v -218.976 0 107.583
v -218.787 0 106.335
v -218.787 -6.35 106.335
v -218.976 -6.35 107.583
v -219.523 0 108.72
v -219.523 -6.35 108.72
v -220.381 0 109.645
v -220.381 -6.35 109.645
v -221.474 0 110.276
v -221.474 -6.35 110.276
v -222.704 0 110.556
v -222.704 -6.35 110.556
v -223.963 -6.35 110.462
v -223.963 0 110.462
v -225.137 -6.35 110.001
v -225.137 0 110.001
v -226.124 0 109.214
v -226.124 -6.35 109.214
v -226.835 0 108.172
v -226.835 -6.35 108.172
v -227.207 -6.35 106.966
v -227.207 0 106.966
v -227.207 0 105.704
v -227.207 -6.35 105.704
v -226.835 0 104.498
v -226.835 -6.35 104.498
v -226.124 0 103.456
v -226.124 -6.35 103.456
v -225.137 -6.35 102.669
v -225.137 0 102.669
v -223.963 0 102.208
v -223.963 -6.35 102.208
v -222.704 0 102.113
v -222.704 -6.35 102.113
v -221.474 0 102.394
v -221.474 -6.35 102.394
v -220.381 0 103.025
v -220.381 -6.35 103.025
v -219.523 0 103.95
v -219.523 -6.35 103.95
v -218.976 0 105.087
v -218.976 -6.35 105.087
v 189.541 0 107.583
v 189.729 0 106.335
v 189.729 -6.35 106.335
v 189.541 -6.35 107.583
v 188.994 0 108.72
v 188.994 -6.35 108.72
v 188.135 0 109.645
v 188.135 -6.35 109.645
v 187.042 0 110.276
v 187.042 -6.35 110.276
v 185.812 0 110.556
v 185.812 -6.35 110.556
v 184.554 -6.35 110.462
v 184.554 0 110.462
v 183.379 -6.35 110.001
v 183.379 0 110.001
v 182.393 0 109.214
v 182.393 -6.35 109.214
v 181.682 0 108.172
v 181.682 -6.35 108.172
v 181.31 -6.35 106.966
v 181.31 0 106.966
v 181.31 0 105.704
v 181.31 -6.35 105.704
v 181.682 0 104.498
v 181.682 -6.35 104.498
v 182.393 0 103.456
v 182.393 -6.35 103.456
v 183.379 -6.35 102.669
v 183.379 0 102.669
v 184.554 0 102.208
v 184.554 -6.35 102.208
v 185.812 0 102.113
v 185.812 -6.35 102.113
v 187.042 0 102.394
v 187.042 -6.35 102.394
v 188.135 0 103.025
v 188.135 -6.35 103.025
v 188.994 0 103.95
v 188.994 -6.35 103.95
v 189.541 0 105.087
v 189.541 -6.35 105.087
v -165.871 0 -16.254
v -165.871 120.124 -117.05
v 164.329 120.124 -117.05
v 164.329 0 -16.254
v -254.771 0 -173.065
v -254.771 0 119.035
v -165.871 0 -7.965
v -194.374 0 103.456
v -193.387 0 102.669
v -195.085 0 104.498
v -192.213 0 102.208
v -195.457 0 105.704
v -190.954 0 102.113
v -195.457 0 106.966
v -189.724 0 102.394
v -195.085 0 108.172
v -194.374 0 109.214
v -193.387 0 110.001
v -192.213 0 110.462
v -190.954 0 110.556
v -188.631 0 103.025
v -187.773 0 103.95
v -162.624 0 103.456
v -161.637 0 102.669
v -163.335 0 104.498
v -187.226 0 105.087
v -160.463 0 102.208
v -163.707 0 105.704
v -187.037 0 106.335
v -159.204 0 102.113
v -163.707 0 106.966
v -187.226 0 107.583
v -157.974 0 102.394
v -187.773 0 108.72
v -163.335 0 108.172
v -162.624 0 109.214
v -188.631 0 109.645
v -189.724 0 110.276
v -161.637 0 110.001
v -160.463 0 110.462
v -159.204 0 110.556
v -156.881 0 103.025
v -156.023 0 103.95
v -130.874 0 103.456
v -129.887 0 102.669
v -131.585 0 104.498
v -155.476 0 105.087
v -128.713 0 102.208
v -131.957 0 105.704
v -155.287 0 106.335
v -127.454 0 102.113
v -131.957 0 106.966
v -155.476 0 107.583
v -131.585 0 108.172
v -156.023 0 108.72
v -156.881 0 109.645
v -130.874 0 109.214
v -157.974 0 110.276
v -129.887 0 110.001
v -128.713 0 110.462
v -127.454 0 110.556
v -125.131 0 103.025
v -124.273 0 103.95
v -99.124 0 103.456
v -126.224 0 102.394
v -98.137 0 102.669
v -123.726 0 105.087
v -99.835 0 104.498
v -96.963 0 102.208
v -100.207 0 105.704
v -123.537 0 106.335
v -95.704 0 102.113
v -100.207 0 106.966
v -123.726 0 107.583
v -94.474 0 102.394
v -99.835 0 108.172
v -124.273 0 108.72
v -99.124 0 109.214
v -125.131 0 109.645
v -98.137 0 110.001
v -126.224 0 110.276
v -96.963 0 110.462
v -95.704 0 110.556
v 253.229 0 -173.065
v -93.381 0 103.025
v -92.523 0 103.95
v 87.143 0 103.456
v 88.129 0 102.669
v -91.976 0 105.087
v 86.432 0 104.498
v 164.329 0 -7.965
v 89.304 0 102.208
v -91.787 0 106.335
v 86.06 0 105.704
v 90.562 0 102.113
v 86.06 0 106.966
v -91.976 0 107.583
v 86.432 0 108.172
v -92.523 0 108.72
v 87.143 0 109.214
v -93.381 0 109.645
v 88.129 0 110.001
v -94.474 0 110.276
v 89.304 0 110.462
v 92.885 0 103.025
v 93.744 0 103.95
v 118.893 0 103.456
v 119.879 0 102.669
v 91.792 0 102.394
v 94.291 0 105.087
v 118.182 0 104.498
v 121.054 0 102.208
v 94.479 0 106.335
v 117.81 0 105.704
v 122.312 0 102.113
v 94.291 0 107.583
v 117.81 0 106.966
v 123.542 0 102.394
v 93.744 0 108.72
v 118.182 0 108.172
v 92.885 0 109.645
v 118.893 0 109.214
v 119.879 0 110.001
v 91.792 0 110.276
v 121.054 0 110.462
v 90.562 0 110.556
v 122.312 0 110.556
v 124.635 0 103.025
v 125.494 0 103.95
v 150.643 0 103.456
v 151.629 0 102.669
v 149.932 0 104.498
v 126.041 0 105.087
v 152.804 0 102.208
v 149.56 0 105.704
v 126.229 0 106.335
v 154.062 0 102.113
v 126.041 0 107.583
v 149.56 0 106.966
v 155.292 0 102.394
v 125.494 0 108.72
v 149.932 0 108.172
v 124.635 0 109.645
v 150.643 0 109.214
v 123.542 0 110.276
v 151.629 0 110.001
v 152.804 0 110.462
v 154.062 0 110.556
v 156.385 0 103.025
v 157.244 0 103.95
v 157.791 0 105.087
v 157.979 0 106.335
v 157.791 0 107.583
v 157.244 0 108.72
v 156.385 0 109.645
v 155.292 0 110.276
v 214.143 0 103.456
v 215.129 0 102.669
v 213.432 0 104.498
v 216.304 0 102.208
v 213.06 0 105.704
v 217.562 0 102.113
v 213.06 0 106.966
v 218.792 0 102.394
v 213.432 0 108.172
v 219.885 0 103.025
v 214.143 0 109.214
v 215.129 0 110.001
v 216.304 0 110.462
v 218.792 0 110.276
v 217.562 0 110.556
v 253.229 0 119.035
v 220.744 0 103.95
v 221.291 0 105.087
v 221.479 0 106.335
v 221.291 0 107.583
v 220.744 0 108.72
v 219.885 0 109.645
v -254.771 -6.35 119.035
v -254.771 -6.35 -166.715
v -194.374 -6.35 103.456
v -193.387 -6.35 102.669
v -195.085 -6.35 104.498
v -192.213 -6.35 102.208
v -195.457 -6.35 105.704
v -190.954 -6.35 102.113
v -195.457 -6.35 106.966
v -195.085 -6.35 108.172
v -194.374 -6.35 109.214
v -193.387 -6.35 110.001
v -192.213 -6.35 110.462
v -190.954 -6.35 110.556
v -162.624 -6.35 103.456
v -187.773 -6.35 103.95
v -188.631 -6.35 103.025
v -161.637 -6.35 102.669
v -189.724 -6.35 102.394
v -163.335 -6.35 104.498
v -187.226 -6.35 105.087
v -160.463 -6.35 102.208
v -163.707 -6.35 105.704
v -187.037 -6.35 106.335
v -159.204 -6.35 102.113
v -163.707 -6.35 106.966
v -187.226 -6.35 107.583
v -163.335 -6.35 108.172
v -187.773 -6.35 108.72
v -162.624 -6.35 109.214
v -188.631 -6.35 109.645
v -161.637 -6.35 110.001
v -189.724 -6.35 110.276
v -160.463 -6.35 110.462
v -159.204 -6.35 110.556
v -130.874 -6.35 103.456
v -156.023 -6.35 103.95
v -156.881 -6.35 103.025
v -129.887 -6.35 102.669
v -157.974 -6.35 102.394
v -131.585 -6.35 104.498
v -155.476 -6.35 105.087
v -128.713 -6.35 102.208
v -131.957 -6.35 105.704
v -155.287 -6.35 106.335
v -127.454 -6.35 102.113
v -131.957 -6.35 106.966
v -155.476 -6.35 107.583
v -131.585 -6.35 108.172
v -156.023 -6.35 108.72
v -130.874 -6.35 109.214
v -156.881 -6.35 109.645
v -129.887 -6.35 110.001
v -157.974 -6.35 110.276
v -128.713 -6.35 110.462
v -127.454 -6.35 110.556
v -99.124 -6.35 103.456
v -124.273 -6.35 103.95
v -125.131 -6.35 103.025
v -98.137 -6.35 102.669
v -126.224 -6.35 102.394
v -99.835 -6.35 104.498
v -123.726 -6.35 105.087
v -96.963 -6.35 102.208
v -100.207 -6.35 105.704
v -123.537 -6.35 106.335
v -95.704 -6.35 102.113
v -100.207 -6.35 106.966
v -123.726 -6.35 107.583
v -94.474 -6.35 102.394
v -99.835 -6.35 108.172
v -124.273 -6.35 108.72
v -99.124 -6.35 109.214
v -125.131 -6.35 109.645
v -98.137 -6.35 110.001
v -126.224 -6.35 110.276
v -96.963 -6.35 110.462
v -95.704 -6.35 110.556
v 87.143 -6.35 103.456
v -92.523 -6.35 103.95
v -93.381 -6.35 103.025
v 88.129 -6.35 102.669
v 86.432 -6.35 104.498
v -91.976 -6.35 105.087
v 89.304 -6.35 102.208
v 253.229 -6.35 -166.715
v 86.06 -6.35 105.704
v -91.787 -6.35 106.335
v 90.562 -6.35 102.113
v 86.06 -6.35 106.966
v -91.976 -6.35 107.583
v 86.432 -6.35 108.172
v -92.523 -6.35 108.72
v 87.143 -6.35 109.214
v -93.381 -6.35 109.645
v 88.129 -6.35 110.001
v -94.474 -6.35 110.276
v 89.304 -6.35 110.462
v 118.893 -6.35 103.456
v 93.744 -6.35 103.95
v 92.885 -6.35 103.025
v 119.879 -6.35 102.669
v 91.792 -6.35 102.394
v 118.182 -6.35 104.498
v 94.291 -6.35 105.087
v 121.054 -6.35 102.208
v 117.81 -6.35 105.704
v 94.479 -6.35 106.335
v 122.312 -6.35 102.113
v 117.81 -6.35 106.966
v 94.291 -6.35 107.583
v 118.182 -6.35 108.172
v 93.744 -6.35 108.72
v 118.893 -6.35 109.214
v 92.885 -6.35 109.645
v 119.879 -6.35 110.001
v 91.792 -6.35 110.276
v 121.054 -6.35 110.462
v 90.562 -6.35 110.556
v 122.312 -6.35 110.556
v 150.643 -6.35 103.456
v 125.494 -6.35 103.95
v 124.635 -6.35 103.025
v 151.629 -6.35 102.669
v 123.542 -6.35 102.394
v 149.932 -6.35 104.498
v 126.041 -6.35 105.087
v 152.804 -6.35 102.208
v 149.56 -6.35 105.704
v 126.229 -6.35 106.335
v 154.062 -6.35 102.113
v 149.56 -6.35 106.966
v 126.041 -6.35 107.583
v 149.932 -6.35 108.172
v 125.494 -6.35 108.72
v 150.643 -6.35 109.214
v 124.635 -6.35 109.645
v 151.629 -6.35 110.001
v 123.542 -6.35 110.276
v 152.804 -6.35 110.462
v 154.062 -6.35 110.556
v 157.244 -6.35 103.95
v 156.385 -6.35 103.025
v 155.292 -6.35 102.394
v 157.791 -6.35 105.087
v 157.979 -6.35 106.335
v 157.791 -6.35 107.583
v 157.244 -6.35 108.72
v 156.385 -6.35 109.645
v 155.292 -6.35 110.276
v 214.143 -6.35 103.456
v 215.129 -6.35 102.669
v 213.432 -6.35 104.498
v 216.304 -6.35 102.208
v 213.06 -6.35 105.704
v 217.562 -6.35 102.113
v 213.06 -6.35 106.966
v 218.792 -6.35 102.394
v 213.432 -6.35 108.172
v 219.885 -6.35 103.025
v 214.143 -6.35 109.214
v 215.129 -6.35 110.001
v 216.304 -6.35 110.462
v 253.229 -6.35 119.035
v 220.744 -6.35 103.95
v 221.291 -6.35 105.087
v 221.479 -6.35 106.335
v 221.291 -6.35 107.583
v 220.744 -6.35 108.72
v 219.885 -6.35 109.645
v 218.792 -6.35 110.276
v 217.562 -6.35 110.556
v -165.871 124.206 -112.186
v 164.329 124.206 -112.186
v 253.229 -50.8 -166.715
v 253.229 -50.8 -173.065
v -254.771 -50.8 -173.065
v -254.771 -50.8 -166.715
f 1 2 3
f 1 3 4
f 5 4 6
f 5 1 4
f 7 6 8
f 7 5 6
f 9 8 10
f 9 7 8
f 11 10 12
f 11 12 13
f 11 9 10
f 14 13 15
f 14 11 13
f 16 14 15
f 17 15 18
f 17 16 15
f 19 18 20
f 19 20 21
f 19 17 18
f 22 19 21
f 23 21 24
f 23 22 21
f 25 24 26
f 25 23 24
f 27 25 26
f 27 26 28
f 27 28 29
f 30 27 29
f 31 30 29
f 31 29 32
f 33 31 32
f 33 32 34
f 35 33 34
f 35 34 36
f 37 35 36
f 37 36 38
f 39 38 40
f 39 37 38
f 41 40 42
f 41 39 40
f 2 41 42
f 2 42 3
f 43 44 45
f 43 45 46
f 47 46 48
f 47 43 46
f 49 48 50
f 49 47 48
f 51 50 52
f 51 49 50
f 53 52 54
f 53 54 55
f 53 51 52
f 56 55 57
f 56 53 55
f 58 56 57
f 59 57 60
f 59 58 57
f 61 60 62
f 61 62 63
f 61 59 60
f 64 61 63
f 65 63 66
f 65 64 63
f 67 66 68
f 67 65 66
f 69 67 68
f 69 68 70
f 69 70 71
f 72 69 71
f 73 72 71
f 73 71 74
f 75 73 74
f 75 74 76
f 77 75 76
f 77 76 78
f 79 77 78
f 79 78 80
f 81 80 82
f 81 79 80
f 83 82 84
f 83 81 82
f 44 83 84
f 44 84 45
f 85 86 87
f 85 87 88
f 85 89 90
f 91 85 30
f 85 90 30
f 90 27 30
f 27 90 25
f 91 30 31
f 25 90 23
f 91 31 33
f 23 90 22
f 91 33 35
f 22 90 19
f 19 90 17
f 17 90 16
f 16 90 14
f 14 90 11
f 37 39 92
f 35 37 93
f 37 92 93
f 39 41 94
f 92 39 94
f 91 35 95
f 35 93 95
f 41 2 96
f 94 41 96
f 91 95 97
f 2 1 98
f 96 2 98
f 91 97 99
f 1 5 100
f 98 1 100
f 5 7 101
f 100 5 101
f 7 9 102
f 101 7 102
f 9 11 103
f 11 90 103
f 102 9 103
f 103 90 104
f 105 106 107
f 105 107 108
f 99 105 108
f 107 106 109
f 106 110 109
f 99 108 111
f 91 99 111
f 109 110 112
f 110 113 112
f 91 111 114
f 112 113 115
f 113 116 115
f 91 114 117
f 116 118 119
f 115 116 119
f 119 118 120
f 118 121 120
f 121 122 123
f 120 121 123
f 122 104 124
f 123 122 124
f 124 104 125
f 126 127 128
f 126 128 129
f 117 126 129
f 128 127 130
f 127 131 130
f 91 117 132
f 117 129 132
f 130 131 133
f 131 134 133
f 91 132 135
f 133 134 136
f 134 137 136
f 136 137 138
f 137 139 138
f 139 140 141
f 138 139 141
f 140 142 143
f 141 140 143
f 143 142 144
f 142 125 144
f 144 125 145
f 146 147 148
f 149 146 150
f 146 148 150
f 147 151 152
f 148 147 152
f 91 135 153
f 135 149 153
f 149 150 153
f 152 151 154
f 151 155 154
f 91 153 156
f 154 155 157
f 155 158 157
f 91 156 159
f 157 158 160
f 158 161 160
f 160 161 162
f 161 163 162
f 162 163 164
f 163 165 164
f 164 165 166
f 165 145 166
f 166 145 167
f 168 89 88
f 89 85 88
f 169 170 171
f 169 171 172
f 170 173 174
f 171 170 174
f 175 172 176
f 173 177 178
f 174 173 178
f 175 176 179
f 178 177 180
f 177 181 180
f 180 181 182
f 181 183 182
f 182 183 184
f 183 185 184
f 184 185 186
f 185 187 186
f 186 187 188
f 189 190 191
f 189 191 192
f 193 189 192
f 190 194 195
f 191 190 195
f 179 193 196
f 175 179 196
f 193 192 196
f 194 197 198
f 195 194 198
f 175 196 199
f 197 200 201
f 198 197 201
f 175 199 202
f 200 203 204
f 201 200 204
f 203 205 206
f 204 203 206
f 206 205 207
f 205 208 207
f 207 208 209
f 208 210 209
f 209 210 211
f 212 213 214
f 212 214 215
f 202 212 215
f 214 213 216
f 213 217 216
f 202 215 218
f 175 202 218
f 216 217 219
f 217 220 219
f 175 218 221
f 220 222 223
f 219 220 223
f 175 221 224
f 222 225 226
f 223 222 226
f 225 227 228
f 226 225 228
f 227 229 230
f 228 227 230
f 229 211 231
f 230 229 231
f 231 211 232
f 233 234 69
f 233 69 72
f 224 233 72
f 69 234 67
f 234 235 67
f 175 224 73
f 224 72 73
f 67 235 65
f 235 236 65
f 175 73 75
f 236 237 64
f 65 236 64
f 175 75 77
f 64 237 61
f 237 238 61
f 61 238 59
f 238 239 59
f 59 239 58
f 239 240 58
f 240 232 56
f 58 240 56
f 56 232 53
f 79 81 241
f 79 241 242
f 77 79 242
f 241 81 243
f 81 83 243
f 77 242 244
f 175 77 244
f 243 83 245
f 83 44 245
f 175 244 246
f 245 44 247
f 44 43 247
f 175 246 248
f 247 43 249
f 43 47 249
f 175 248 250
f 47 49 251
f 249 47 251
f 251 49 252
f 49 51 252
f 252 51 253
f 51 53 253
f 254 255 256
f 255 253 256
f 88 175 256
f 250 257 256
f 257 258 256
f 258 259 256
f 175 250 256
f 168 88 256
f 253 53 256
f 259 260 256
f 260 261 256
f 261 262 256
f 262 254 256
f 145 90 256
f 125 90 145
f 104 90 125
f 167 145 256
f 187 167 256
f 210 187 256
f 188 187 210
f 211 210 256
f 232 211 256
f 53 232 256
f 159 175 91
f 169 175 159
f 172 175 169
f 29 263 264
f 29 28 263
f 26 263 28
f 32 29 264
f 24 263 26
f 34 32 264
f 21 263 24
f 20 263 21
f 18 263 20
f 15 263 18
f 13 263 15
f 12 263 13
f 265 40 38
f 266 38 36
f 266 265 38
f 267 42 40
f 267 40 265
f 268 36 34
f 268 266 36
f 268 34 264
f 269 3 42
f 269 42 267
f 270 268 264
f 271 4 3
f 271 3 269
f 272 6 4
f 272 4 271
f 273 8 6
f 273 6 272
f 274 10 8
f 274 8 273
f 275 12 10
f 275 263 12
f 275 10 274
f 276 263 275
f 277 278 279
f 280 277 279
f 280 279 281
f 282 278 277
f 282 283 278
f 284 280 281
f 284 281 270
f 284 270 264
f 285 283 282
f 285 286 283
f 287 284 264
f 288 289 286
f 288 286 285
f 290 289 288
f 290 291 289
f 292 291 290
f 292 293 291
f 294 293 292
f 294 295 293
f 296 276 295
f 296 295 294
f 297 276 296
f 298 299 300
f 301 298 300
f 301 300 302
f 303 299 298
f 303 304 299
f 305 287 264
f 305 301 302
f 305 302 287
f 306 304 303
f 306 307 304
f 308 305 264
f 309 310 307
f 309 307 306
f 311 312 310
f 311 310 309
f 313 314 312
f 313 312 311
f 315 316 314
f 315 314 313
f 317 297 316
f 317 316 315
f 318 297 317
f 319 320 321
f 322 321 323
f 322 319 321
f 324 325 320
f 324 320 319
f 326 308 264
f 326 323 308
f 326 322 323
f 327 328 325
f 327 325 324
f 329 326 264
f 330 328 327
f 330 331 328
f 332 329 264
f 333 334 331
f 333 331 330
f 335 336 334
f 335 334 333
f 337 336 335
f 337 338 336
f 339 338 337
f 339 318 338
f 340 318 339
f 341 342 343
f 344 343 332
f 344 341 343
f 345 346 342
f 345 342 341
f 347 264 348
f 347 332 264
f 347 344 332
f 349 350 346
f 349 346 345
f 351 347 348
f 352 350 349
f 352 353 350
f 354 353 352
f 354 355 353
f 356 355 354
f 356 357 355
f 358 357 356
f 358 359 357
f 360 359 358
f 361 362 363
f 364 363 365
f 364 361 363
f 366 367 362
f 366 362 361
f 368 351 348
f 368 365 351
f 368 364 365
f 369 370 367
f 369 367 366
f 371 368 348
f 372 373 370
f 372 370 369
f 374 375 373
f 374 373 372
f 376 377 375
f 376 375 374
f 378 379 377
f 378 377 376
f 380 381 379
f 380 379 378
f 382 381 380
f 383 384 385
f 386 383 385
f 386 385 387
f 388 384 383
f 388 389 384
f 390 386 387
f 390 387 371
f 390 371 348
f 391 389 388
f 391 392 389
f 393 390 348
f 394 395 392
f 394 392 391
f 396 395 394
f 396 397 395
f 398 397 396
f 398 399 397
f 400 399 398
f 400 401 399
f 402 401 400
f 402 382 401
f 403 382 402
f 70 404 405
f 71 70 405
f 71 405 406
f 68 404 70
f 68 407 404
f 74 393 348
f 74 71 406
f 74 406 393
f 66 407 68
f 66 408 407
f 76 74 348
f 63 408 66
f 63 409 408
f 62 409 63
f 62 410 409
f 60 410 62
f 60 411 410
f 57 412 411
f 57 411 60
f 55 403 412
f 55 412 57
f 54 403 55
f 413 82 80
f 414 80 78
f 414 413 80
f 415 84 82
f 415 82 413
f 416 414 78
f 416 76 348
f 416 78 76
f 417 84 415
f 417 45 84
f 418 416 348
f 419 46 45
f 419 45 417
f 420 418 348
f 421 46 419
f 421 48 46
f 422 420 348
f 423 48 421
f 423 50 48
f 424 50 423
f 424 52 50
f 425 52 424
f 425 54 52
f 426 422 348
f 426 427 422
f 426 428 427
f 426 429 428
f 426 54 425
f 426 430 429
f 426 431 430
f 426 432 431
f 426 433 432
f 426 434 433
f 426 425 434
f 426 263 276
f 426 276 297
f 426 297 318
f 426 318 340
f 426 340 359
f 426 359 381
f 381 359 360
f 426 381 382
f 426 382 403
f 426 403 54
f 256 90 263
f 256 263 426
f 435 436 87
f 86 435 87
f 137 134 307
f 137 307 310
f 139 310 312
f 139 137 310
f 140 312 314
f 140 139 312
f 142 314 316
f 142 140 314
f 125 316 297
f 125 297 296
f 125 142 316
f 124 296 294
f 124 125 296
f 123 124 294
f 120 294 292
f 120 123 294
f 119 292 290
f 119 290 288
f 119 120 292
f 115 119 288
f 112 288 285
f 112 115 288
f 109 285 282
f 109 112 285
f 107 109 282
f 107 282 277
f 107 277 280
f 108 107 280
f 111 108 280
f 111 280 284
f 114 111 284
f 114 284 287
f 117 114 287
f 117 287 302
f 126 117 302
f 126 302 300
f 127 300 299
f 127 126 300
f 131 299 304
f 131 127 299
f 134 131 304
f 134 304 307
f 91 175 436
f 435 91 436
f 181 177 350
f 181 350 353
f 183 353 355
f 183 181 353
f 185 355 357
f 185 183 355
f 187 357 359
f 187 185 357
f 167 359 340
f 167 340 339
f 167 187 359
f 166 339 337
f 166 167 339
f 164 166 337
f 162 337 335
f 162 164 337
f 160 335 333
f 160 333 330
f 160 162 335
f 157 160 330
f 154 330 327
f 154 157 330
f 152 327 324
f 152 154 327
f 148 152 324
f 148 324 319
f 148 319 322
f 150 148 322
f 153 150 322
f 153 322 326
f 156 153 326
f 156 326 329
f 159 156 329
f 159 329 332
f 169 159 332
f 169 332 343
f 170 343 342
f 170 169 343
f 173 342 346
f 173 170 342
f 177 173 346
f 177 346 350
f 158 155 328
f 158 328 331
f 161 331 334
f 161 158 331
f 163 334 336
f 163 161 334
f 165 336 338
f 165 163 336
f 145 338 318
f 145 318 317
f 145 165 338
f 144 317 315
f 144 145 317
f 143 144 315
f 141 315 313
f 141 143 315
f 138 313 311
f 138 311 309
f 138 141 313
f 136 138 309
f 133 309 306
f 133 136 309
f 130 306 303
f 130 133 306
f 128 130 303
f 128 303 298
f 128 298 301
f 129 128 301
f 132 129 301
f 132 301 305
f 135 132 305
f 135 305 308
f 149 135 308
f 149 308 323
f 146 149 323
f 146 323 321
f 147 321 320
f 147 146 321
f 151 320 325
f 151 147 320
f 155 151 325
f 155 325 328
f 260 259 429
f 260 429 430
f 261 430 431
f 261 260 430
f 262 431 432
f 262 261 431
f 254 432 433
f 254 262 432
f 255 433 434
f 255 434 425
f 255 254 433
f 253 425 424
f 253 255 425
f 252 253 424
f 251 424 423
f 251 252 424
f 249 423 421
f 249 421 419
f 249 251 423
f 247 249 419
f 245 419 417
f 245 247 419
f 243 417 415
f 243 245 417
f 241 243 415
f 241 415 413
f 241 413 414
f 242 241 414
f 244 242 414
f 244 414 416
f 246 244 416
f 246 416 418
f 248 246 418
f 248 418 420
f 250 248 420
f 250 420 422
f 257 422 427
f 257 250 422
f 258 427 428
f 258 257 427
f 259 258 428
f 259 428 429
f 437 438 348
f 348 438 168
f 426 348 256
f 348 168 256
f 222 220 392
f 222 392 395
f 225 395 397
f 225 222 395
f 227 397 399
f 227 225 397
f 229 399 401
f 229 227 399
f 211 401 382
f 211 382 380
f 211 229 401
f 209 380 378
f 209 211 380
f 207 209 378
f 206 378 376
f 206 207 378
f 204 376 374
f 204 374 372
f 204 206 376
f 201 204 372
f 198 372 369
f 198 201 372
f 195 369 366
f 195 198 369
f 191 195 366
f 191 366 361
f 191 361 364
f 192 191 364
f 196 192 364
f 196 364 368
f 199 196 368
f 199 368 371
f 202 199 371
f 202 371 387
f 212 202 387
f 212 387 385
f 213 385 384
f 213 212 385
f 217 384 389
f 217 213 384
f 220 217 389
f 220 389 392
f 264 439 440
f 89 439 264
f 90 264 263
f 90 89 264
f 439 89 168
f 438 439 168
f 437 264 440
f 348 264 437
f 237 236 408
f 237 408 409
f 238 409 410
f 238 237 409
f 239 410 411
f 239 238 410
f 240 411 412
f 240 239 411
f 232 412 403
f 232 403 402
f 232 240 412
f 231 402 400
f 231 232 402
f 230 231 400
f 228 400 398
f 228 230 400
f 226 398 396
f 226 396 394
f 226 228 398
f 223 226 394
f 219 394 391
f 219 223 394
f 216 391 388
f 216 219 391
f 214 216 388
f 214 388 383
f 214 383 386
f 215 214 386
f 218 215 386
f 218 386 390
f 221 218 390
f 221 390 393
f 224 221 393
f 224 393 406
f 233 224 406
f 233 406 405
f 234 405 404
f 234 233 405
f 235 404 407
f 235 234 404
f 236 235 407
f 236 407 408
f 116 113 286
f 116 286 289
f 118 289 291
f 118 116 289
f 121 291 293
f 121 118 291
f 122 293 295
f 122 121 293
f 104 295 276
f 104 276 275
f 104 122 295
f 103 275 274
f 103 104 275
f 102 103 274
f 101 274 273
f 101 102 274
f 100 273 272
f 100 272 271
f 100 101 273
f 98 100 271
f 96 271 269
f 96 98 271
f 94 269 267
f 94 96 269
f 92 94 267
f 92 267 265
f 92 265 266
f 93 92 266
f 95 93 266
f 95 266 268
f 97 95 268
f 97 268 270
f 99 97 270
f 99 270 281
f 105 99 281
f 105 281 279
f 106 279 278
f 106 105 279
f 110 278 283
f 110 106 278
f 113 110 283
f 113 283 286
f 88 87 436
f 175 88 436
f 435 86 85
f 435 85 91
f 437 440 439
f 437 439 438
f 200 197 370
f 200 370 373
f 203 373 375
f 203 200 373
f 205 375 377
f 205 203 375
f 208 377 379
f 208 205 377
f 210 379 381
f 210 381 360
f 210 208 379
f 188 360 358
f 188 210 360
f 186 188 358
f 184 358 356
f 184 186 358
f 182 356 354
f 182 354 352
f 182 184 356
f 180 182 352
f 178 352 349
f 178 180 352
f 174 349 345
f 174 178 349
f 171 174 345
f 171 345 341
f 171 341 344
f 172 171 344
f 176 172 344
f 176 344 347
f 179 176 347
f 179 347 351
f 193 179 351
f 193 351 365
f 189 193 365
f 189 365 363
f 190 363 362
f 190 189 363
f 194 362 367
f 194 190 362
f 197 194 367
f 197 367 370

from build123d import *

# Parameters (mm, degrees)
F0_W     = 508
F0_H     = 285.75
F0_R     = 4.233333
F1_DEPTH = 6.35
F0_H_2   = 6.35
F2_DEPTH = 50.8
F3_W     = 330.2
F3_H     = 165.1
F4_DEPTH = 152.4
F6_DEPTH = 419.101


with BuildPart() as f1:
    # F0 (on Front) → F1 (new body)
    with BuildSketch(Plane.XZ):
        with Locations((-0.770811, -23.840043)):
            Rectangle(F0_W, F0_H)
        with Locations((-223.020811, 106.334957)):
            Circle(F0_R, mode=Mode.SUBTRACT)
        with Locations((-191.270811, 106.334957)):
            Circle(F0_R, mode=Mode.SUBTRACT)
        with Locations((-159.520811, 106.334957)):
            Circle(F0_R, mode=Mode.SUBTRACT)
        with Locations((-127.770811, 106.334957)):
            Circle(F0_R, mode=Mode.SUBTRACT)
        with Locations((-96.020811, 106.334957)):
            Circle(F0_R, mode=Mode.SUBTRACT)
        with Locations((90.245856, 106.334957)):
            Circle(F0_R, mode=Mode.SUBTRACT)
        with Locations((121.995856, 106.334957)):
            Circle(F0_R, mode=Mode.SUBTRACT)
        with Locations((153.745856, 106.334957)):
            Circle(F0_R, mode=Mode.SUBTRACT)
        with Locations((185.495856, 106.334957)):
            Circle(F0_R, mode=Mode.SUBTRACT)
        with Locations((217.245856, 106.334957)):
            Circle(F0_R, mode=Mode.SUBTRACT)
    extrude(amount=F1_DEPTH)

    # F0 (on Front) → F2 (join)
    with BuildSketch(Plane.XZ):
        with Locations((-0.770811, -169.890043)):
            Rectangle(F0_W, F0_H_2)
    extrude(amount=F2_DEPTH)

    # F3 (on face) → F4 (join)
    with BuildSketch(Plane.XZ):
        with Locations((-0.770811, -90.515043)):
            Rectangle(F3_W, F3_H)
    extrude(amount=-F4_DEPTH)

    # F5 (on face) → F6 (cut, through all)
    with BuildSketch(Plane.YZ.offset(164.329189)):
        Polygon((124.205639, -112.185949), (120.123938, -117.050331), (0, -173.065043), (152.4, -173.065043), (152.4, -7.965043), (0, -7.965043), align=None)
        Polygon((120.123938, -117.050331), (0, -16.254379), (0, -173.065043), align=None)
    extrude(amount=-F6_DEPTH, mode=Mode.SUBTRACT)


solid = f1.part
